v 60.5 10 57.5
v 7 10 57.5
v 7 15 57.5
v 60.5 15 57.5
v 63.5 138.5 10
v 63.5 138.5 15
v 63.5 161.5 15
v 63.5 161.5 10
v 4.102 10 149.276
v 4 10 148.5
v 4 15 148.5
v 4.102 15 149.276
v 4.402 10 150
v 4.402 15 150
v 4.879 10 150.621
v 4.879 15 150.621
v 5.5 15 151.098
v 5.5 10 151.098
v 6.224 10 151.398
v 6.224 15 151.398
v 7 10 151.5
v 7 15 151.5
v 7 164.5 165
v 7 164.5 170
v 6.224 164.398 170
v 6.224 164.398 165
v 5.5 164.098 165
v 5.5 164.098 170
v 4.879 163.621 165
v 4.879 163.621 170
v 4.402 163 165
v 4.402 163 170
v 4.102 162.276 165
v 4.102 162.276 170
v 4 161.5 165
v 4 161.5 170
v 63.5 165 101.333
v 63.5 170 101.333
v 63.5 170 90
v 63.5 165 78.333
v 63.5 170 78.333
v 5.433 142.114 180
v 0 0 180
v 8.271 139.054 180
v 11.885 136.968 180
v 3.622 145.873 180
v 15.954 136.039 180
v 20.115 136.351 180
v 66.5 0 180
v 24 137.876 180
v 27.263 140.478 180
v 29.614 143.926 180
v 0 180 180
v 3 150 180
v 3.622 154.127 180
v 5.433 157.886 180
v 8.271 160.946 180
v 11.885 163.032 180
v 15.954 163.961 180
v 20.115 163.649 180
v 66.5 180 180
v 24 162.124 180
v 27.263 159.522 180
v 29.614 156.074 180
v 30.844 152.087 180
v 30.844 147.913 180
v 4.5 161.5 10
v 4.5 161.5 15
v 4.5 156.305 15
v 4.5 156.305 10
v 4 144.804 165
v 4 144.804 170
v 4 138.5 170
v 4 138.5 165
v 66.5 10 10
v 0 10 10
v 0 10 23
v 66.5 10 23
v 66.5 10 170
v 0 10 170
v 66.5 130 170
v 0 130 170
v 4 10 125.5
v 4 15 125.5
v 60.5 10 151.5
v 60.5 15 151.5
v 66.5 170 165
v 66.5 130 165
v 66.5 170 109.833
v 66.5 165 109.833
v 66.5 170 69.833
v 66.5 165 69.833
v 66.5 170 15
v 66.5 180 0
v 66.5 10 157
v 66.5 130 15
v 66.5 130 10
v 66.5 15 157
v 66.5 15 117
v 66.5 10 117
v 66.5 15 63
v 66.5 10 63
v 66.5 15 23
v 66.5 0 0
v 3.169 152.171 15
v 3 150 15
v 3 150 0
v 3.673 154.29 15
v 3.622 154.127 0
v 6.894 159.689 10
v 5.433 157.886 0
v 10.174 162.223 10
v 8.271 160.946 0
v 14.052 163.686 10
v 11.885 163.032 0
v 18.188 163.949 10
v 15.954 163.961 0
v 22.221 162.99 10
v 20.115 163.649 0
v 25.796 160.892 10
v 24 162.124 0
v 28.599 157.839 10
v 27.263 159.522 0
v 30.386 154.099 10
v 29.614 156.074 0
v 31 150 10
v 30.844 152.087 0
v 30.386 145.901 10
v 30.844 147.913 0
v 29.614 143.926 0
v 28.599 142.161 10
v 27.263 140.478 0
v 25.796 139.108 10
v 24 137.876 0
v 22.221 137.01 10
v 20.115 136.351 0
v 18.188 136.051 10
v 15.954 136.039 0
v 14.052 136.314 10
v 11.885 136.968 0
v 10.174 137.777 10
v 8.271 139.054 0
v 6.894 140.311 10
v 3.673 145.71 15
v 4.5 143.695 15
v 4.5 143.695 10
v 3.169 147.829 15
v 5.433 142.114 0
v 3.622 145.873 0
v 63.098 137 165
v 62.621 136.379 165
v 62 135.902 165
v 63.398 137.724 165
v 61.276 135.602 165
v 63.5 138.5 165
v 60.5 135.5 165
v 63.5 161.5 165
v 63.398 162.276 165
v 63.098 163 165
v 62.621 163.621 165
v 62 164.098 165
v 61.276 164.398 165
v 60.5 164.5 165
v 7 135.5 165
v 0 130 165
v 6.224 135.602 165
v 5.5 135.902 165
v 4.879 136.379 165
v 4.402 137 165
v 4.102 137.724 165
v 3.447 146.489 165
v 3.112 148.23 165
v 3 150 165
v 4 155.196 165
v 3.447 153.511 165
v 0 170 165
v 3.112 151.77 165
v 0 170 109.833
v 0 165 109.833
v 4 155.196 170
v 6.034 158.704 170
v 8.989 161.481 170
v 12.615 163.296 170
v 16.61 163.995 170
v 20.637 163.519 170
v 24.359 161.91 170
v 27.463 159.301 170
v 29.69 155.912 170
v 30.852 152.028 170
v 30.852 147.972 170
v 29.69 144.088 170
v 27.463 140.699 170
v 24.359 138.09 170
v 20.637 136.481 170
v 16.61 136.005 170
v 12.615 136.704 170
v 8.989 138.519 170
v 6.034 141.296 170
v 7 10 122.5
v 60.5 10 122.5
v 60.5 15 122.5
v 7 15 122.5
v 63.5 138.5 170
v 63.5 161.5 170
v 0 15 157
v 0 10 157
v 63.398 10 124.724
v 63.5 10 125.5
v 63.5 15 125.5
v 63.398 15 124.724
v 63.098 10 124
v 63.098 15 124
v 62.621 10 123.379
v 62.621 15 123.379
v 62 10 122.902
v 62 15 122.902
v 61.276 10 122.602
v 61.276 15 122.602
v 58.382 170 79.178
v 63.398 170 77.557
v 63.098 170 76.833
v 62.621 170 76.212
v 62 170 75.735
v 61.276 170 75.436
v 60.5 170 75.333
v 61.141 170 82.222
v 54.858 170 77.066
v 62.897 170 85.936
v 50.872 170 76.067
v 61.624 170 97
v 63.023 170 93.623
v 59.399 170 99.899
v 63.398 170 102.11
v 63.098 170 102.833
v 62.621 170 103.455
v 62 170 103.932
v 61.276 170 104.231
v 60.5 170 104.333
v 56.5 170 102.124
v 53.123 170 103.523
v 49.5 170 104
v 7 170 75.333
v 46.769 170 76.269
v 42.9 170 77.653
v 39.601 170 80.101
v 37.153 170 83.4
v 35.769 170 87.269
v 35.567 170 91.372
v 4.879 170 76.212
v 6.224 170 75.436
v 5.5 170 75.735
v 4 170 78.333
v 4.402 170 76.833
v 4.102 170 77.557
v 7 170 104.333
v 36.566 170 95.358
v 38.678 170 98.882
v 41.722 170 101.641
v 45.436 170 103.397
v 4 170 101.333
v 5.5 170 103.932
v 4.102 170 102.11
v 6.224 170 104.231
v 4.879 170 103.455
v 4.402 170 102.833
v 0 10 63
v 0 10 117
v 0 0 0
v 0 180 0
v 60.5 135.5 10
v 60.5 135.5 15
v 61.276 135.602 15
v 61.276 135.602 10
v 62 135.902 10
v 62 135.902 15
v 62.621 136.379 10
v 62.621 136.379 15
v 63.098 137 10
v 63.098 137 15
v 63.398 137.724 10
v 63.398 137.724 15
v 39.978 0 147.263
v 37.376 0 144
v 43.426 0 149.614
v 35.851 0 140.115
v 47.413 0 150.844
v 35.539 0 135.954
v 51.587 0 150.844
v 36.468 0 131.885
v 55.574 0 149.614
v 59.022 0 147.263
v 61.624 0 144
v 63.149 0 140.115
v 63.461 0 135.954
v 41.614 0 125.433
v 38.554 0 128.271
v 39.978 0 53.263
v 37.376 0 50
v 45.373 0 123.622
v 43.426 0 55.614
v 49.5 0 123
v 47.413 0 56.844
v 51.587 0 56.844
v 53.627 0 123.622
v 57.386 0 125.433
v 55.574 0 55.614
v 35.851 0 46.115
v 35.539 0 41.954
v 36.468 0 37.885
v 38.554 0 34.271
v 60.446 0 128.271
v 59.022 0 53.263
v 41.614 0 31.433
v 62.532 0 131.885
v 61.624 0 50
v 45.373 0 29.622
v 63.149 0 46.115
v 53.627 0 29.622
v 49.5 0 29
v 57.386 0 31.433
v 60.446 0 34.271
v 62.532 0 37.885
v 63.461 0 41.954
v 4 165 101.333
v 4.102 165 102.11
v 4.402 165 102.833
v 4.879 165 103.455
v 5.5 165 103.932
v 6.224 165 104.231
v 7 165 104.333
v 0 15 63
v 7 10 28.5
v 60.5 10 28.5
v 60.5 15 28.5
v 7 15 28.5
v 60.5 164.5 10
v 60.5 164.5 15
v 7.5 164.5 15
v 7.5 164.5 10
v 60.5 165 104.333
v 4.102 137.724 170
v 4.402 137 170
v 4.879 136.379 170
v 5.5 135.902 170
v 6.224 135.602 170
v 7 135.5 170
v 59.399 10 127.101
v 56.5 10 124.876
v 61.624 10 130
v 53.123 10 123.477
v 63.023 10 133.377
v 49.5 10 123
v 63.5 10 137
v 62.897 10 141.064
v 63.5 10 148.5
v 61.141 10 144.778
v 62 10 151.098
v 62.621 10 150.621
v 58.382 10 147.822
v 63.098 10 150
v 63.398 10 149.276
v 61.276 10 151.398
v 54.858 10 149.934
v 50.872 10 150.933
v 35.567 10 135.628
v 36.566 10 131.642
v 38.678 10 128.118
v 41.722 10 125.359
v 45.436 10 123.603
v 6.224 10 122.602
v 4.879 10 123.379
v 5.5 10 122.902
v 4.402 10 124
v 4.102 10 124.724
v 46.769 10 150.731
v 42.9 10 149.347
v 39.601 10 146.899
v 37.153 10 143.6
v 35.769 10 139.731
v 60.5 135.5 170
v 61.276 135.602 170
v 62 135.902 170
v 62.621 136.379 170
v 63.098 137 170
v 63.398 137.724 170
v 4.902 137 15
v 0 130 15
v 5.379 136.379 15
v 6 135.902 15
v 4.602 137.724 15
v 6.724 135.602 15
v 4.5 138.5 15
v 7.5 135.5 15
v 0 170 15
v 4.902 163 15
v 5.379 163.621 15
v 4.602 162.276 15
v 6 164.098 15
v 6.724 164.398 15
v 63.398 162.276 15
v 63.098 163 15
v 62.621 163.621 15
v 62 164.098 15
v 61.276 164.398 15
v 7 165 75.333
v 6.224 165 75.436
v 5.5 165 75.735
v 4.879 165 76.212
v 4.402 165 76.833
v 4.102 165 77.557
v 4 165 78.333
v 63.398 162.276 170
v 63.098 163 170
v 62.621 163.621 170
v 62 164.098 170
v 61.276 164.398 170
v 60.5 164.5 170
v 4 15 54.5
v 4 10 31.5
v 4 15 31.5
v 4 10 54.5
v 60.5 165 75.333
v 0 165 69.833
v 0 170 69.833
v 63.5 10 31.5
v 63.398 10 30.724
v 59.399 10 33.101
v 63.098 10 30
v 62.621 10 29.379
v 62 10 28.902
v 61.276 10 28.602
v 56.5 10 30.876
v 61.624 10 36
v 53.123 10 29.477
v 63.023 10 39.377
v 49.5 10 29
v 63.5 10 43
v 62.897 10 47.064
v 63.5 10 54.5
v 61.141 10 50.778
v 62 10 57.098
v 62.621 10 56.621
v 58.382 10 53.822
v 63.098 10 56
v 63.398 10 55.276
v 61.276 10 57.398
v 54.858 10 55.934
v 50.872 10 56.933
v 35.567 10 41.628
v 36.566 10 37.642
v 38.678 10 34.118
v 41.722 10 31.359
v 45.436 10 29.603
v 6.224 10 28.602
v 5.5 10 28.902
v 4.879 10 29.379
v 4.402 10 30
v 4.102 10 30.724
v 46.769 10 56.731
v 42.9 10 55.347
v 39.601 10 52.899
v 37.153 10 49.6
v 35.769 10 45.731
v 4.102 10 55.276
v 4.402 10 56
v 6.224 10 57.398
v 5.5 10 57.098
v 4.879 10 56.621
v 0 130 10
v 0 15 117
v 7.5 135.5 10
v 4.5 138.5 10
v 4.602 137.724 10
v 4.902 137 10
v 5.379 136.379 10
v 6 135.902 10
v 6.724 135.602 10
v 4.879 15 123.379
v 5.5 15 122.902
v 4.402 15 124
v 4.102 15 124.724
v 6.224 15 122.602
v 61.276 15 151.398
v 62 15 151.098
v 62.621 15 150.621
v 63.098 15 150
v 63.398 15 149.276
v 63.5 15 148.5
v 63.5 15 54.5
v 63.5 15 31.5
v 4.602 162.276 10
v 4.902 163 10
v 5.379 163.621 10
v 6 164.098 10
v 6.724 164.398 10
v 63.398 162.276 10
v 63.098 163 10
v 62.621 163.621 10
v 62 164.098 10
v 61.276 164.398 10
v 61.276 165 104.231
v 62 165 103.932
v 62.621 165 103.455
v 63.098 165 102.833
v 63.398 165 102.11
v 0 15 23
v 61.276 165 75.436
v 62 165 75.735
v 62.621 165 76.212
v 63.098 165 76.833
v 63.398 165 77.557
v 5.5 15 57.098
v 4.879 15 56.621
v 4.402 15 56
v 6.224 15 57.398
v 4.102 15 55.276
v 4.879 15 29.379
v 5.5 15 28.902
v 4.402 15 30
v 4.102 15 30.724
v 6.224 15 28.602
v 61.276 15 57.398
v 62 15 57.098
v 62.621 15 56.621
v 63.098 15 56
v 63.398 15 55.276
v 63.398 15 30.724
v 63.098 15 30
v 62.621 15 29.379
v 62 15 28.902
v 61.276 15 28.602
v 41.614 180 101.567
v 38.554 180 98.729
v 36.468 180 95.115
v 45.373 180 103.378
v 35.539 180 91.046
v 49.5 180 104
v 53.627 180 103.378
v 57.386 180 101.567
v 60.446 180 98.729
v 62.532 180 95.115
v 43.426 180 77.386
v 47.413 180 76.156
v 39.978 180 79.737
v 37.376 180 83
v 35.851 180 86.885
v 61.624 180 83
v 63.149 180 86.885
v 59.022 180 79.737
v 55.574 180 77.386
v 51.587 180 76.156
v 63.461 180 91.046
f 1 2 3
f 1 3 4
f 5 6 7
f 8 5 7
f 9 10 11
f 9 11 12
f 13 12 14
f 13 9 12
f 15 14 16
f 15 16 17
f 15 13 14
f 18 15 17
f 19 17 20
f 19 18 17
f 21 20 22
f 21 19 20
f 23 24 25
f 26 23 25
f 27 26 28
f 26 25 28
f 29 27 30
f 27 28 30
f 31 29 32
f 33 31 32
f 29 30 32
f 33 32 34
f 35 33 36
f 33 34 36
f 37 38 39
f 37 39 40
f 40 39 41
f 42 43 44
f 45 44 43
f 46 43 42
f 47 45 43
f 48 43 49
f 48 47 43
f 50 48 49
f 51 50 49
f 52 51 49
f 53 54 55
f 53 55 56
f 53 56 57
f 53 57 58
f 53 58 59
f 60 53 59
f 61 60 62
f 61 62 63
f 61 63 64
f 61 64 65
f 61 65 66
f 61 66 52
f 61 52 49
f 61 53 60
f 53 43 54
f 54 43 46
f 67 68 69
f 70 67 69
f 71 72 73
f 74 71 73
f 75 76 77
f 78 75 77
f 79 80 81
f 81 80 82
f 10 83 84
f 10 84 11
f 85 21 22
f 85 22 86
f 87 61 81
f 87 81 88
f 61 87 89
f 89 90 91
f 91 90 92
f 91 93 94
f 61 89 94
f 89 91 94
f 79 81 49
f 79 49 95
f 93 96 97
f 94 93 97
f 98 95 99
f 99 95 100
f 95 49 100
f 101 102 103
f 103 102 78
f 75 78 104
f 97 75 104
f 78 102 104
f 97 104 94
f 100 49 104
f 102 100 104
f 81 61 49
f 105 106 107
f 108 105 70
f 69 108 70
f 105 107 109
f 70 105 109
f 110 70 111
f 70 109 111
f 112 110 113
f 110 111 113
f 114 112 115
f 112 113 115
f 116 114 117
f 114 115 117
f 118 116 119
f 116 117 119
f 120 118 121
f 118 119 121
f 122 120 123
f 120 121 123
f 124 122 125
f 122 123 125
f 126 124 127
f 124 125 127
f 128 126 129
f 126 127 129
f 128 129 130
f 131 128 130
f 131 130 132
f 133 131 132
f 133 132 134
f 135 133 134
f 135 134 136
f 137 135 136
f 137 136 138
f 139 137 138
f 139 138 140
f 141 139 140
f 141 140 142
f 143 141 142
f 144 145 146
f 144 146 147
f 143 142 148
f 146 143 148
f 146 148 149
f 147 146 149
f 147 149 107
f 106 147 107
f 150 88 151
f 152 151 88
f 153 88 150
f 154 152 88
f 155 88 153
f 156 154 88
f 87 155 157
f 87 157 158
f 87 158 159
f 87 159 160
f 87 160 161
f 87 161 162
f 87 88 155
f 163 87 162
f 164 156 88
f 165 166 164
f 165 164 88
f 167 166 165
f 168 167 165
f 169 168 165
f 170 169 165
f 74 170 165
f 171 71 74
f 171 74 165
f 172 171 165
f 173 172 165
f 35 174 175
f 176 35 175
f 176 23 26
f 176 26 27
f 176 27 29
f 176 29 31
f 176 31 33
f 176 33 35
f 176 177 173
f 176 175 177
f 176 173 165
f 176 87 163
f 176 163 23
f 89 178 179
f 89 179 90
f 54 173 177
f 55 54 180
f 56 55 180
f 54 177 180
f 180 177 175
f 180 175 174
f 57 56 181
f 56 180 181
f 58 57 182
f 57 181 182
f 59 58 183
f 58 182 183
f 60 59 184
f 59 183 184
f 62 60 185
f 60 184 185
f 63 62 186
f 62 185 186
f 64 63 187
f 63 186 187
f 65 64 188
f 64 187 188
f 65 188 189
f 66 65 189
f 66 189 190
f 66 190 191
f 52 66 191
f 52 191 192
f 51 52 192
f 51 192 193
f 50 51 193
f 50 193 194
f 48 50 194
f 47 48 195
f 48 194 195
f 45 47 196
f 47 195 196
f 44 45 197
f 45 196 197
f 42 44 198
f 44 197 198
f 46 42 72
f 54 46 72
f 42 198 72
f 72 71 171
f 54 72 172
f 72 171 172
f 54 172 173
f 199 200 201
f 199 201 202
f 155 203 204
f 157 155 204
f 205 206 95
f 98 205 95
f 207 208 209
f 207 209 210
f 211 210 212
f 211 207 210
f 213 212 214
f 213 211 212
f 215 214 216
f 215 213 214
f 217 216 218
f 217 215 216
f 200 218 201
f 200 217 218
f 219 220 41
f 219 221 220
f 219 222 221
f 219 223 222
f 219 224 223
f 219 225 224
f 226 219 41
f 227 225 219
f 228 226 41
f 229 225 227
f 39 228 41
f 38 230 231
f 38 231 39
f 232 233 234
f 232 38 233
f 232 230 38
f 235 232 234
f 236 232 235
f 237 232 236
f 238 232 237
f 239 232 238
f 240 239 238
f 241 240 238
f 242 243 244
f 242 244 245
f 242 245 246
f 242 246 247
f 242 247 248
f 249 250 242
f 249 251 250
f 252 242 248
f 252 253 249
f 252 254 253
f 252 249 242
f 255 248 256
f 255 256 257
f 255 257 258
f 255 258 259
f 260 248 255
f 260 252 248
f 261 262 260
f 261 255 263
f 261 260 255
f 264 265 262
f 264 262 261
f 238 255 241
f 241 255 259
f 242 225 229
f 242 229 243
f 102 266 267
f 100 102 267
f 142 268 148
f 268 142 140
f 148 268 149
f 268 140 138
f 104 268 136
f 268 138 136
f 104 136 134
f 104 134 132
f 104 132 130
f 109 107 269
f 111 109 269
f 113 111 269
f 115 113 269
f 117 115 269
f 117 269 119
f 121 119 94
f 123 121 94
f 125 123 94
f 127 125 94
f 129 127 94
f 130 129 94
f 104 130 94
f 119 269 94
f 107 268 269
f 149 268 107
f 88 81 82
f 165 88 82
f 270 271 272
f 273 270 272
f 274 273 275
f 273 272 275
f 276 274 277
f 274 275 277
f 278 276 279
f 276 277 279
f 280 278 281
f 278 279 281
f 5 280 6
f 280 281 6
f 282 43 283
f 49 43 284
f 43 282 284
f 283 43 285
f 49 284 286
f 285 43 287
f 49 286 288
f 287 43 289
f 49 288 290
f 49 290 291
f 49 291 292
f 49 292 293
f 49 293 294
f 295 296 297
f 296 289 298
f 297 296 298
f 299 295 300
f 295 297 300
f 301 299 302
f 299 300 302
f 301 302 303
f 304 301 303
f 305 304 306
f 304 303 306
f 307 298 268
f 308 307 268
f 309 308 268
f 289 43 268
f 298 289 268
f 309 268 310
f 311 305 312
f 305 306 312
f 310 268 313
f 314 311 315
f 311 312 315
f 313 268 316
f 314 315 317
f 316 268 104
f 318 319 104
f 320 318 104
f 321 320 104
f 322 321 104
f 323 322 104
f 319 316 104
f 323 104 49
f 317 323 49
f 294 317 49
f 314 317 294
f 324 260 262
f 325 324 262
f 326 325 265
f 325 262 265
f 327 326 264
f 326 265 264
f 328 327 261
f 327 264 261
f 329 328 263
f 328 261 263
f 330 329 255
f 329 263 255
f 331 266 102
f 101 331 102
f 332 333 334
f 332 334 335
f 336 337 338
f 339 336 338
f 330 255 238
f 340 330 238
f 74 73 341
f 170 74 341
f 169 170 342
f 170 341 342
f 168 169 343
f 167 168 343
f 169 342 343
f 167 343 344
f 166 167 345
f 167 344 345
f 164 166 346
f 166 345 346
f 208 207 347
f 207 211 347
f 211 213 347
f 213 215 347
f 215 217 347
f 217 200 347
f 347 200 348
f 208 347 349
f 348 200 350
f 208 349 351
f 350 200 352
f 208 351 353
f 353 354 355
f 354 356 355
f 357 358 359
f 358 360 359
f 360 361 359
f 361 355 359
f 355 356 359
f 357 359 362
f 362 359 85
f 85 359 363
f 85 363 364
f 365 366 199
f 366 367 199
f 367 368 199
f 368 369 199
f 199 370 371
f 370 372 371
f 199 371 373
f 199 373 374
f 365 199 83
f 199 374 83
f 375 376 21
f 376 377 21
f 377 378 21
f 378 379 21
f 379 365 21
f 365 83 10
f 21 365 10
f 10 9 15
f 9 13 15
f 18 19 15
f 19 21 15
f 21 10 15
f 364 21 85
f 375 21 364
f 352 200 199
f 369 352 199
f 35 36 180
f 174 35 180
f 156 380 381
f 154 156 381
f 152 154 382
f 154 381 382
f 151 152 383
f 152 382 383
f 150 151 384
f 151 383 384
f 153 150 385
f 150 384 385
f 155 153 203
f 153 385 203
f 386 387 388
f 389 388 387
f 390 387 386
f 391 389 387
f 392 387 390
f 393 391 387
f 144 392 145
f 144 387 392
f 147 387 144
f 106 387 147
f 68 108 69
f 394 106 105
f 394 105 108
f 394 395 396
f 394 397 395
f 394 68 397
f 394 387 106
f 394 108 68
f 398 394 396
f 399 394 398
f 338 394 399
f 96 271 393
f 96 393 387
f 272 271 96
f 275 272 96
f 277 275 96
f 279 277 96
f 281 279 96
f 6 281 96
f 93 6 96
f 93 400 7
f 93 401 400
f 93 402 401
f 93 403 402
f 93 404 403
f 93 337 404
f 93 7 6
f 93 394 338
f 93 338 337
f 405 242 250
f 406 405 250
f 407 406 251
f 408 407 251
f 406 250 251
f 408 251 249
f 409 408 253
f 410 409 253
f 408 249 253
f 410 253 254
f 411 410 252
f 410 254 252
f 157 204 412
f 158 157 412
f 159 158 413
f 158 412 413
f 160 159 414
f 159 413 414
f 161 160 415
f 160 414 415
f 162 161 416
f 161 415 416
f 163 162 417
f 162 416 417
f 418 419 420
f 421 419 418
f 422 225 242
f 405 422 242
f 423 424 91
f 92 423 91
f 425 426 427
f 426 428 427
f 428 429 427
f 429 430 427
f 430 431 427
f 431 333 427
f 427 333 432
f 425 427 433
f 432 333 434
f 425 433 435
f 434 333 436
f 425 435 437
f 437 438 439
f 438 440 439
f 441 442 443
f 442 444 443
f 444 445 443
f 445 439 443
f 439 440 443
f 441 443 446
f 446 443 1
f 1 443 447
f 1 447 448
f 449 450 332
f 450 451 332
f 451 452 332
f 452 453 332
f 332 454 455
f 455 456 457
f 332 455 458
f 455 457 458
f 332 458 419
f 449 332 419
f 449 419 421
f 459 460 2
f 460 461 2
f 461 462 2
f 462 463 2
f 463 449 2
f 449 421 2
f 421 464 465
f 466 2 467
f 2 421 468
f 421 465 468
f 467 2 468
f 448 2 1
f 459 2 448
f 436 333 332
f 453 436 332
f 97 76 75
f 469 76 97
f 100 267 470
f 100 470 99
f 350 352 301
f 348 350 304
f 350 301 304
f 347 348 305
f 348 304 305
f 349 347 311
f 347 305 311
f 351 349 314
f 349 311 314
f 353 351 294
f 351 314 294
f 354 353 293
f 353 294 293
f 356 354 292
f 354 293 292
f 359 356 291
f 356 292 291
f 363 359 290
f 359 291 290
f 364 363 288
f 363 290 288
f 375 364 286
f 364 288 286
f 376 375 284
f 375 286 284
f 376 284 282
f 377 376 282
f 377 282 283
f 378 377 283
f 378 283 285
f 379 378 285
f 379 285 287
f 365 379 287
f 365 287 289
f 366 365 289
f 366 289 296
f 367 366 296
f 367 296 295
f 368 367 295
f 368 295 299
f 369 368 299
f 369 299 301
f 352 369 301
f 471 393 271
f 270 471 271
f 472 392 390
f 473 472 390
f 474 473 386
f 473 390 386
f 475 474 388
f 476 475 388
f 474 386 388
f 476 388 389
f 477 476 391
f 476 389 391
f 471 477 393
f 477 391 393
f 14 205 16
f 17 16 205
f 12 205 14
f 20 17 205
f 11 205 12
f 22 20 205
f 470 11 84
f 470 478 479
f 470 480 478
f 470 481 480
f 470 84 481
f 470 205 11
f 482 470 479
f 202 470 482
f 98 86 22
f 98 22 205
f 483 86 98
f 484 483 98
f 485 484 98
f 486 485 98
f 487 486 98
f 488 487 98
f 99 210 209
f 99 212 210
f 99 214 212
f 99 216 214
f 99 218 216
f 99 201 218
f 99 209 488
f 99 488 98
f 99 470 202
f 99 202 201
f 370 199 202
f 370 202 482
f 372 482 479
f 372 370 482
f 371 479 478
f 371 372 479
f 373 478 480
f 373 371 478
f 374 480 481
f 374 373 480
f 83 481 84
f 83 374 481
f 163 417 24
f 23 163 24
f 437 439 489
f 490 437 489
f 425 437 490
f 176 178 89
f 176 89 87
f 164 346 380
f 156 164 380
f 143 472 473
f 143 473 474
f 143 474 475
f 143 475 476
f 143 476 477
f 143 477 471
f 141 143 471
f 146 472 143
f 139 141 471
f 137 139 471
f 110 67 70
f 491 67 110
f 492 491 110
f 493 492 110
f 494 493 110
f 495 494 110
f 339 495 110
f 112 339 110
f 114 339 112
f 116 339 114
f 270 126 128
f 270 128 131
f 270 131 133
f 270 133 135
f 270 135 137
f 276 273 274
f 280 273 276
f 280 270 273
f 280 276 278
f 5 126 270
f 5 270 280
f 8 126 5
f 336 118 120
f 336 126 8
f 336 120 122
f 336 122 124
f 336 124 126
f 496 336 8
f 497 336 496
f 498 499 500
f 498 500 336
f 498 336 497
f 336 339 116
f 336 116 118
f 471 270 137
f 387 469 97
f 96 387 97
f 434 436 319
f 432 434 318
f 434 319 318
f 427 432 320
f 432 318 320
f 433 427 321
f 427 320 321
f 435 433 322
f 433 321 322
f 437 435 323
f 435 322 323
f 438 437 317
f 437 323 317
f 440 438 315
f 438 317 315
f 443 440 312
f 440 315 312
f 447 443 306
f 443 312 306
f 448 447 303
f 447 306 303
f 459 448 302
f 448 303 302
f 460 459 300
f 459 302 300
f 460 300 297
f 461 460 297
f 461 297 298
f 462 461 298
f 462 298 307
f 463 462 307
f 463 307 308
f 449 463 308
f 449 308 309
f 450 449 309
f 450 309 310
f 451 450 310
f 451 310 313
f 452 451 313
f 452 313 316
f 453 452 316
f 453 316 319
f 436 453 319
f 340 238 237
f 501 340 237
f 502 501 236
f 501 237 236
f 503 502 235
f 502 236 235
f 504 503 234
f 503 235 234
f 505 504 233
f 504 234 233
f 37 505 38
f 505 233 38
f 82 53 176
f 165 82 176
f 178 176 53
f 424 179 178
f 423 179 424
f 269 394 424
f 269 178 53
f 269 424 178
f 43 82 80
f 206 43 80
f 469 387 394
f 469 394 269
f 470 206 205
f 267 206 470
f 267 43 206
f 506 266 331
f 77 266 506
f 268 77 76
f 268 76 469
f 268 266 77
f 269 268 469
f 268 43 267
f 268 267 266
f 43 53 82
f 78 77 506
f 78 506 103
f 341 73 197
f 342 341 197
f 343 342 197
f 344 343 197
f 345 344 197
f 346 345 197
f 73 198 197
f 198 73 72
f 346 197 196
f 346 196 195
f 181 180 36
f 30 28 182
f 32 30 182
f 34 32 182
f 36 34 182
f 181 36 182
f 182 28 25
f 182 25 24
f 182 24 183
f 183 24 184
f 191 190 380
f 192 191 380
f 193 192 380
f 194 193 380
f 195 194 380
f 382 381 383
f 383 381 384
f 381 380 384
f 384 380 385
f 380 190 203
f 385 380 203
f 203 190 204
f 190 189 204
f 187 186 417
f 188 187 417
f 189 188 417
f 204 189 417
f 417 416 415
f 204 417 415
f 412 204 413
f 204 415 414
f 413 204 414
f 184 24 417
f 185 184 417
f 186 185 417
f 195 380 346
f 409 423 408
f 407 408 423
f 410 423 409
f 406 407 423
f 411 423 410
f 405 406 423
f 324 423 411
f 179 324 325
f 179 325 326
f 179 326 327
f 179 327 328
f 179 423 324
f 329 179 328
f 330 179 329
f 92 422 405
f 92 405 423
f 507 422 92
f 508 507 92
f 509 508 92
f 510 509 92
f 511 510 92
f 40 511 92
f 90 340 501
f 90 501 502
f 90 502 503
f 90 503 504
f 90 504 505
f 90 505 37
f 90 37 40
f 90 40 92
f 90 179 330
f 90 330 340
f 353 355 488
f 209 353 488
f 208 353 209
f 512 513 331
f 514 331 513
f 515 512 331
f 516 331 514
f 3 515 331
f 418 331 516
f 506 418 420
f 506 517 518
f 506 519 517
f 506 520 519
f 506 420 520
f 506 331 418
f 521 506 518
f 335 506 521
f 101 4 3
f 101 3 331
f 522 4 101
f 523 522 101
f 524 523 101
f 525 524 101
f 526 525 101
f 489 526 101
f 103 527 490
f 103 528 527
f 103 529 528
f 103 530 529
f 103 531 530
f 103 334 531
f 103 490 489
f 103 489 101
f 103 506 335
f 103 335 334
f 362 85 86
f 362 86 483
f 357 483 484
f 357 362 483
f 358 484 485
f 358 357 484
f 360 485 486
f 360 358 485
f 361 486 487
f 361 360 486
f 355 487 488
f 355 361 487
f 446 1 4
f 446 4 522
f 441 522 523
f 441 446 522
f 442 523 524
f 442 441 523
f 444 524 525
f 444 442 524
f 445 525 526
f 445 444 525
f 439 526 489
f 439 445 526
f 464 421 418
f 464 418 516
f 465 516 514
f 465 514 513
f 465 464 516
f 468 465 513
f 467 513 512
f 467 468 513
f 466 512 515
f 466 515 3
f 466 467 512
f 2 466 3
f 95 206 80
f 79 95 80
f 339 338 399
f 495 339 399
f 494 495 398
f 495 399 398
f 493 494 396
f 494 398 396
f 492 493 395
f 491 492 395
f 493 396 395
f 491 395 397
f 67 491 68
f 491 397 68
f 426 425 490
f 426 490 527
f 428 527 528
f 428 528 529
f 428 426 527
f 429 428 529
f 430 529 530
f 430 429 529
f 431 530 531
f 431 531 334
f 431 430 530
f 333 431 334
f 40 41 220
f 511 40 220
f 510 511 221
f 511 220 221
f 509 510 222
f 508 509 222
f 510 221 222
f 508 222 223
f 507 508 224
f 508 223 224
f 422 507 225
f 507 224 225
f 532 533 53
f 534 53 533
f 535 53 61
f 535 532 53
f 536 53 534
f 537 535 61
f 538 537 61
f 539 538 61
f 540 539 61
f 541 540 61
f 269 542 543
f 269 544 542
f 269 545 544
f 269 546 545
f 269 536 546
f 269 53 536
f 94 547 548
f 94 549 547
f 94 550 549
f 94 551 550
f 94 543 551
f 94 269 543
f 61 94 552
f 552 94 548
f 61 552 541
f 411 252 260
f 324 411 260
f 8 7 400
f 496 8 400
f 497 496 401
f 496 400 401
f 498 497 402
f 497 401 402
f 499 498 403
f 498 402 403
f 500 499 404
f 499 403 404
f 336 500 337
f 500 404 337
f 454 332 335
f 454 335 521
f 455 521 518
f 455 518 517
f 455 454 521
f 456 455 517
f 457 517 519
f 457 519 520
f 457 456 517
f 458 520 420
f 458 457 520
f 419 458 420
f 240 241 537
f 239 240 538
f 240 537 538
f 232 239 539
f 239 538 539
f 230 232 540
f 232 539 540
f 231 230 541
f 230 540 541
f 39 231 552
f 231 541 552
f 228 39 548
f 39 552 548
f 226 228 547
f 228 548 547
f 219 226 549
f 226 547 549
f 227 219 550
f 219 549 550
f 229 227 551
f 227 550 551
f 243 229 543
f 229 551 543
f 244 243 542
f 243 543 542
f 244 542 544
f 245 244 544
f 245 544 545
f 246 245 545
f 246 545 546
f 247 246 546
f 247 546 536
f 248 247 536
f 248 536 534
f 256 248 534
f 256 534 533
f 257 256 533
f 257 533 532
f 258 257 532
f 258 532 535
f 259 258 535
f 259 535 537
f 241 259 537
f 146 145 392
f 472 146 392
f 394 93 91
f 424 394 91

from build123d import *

# Parameters (mm, degrees)
SKETCH1_W                = 66.5
SKETCH1_H                = 180
BOSS_EXTRUDE1_DEPTH      = 180
SKETCH3_W                = 160
SKETCH3_H                = 160
CUT_EXTRUDE1_DEPTH       = 180
SKETCH8_W                = 66.5
SKETCH8_H                = 40
BOSS_EXTRUDE2_DEPTH      = 5
SKETCH10_W               = 66.5
SKETCH10_H               = 40
BOSS_EXTRUDE3_DEPTH      = 5
SKETCH5_R                = 14
CUT_EXTRUDE3_DEPTH       = 10
CUT_EXTRUDE5_DEPTH       = 5
CUT_EXTRUDE6_START       = -5
CUT_EXTRUDE6_DEPTH       = 5
SKETCH12_W               = 66.5
SKETCH12_H               = 40
BOSS_EXTRUDE8_DEPTH      = 5
SKETCH15_R               = 14
CUT_EXTRUDE7_DEPTH       = 200
SKETCH7_R                = 14
CORTE_EXTRUS_O1_DEPTH    = 10
SKETCH13_W               = 66.5
SKETCH13_H               = 40
RESSALTO_EXTRUS_O1_DEPTH = 5


with BuildPart() as part:
    # Sketch1 → Boss-Extrude1 (new body)
    with BuildSketch(Plane.XY):
        with Locations((33.25, 90)):
            Rectangle(SKETCH1_W, SKETCH1_H)
    extrude(amount=BOSS_EXTRUDE1_DEPTH)

    # Sketch3 → Cut-Extrude1 (cut)
    with BuildSketch(Plane.ZY):
        with Locations((90, 90)):
            Rectangle(SKETCH3_W, SKETCH3_H)
    extrude(amount=-CUT_EXTRUDE1_DEPTH, mode=Mode.SUBTRACT)

    # Sketch8 → Boss-Extrude2 (add)
    with BuildSketch(Plane.XY.offset(10)):
        with Locations((33.25, 150)):
            Rectangle(SKETCH8_W, SKETCH8_H)
    extrude(amount=BOSS_EXTRUDE2_DEPTH)

    # Sketch10 → Boss-Extrude3 (add)
    with BuildSketch(Plane(origin=(0, 0, 170), x_dir=(-1, 0, 0), z_dir=(0, 0, -1))):
        with Locations((-33.25, 150)):
            Rectangle(SKETCH10_W, SKETCH10_H)
    extrude(amount=BOSS_EXTRUDE3_DEPTH)

    # Sketch5 → Cut-Extrude3 (cut)
    with BuildSketch(Plane(origin=(0, 180, 0), x_dir=(1, 0, 0), z_dir=(0, 1, 0))):
        with Locations(Location((49.5, -90, 0), (0, 0, 270))):
            Circle(SKETCH5_R)
    extrude(amount=-CUT_EXTRUDE3_DEPTH, mode=Mode.SUBTRACT)

    # Sketch9 → Cut-Extrude5 (cut)
    with BuildSketch(Plane.XY.offset(15)):
        with BuildLine():
            Line((60.5, 164.5), (7.5, 164.5))
            ThreePointArc((7.5, 164.5), (5.378679656, 163.621320344), (4.5, 161.5))
            Line((4.5, 161.5), (4.5, 138.5))
            ThreePointArc((4.5, 138.5), (5.378679656, 136.378679656), (7.5, 135.5))
            Line((7.5, 135.5), (60.5, 135.5))
            ThreePointArc((60.5, 135.5), (62.621320344, 136.378679656), (63.5, 138.5))
            Line((63.5, 138.5), (63.5, 161.5))
            ThreePointArc((63.5, 161.5), (62.621320344, 163.621320344), (60.5, 164.5))
        make_face()
    extrude(amount=-CUT_EXTRUDE5_DEPTH, mode=Mode.SUBTRACT)

    # Sketch11 → Cut-Extrude6 (cut)
    with BuildSketch(Plane(origin=(0, 0, 165), x_dir=(-1, 0, 0), z_dir=(0, 0, -1)).offset(CUT_EXTRUDE6_START)):
        with BuildLine():
            Line((-60.5, 164.5), (-7, 164.5))
            ThreePointArc((-7, 164.5), (-4.878679656, 163.621320344), (-4, 161.5))
            Line((-4, 161.5), (-4, 138.5))
            ThreePointArc((-4, 138.5), (-4.878679656, 136.378679656), (-7, 135.5))
            Line((-7, 135.5), (-60.5, 135.5))
            ThreePointArc((-60.5, 135.5), (-62.621320344, 136.378679656), (-63.5, 138.5))
            Line((-63.5, 138.5), (-63.5, 161.5))
            ThreePointArc((-63.5, 161.5), (-62.621320344, 163.621320344), (-60.5, 164.5))
        make_face()
    extrude(amount=CUT_EXTRUDE6_DEPTH, mode=Mode.SUBTRACT)

    # Sketch12 → Boss-Extrude8 (add)
    with BuildSketch(Plane.XZ.offset(-170)):
        with Locations((33.25, 89.833476808)):
            Rectangle(SKETCH12_W, SKETCH12_H)
        with BuildLine():
            Line((60.5, 75.333476808), (7, 75.333476808))
            ThreePointArc((7, 75.333476808), (4.878679656, 76.212156465), (4, 78.333476808))
            Line((4, 78.333476808), (4, 101.333476808))
            ThreePointArc((4, 101.333476808), (4.878679656, 103.454797152), (7, 104.333476808))
            Line((7, 104.333476808), (60.5, 104.333476808))
            ThreePointArc((60.5, 104.333476808), (62.621320344, 103.454797152), (63.5, 101.333476808))
            Line((63.5, 101.333476808), (63.5, 78.333476808))
            ThreePointArc((63.5, 78.333476808), (62.621320344, 76.212156465), (60.5, 75.333476808))
        make_face(mode=Mode.SUBTRACT)
    extrude(amount=BOSS_EXTRUDE8_DEPTH)

    # Sketch15 → Cut-Extrude7 (cut)
    with BuildSketch(Plane(origin=(0, 0, 0), x_dir=(-1, 0, 0), z_dir=(0, 0, -1))):
        with Locations((-17, 150)):
            Circle(SKETCH15_R)
    extrude(amount=-CUT_EXTRUDE7_DEPTH, mode=Mode.SUBTRACT)

    # Sketch7 → Corte-extrusão1 (cut)
    with BuildSketch(Plane.XZ):
        with Locations(Location((49.5, 43, 0), (0, 0, 270))):
            Circle(SKETCH7_R)
        with Locations(Location((49.5, 137, 0), (0, 0, 270))):
            Circle(SKETCH7_R)
    extrude(amount=-CORTE_EXTRUS_O1_DEPTH, mode=Mode.SUBTRACT)

    # Sketch13 → Ressalto-extrusão1 (add)
    # profile 1 of 2: a face of its own
    with BuildSketch(Plane(origin=(0, 10, 0), x_dir=(1, 0, 0), z_dir=(0, 1, 0))):
        with Locations((33.25, -43)):
            Rectangle(SKETCH13_W, SKETCH13_H)
        with BuildLine():
            Line((7, -57.5), (60.5, -57.5))
            ThreePointArc((60.5, -57.5), (62.621320344, -56.621320344), (63.5, -54.5))
            Line((63.5, -54.5), (63.5, -31.5))
            ThreePointArc((63.5, -31.5), (62.621320344, -29.378679656), (60.5, -28.5))
            Line((60.5, -28.5), (7, -28.5))
            ThreePointArc((7, -28.5), (4.878679656, -29.378679656), (4, -31.5))
            Line((4, -31.5), (4, -54.5))
            ThreePointArc((4, -54.5), (4.878679656, -56.621320344), (7, -57.5))
        make_face(mode=Mode.SUBTRACT)
    # profile 2 of 2: a face of its own
    with BuildSketch(Plane(origin=(0, 10, 0), x_dir=(1, 0, 0), z_dir=(0, 1, 0))):
        with Locations((33.25, -137)):
            Rectangle(SKETCH13_W, SKETCH13_H)
        with BuildLine():
            Line((7, -151.5), (60.5, -151.5))
            ThreePointArc((60.5, -151.5), (62.621320344, -150.621320344), (63.5, -148.5))
            Line((63.5, -148.5), (63.5, -125.5))
            ThreePointArc((63.5, -125.5), (62.621320344, -123.378679656), (60.5, -122.5))
            Line((60.5, -122.5), (7, -122.5))
            ThreePointArc((7, -122.5), (4.878679656, -123.378679656), (4, -125.5))
            Line((4, -125.5), (4, -148.5))
            ThreePointArc((4, -148.5), (4.878679656, -150.621320344), (7, -151.5))
        make_face(mode=Mode.SUBTRACT)
    extrude(amount=RESSALTO_EXTRUS_O1_DEPTH)


solid = part.part
